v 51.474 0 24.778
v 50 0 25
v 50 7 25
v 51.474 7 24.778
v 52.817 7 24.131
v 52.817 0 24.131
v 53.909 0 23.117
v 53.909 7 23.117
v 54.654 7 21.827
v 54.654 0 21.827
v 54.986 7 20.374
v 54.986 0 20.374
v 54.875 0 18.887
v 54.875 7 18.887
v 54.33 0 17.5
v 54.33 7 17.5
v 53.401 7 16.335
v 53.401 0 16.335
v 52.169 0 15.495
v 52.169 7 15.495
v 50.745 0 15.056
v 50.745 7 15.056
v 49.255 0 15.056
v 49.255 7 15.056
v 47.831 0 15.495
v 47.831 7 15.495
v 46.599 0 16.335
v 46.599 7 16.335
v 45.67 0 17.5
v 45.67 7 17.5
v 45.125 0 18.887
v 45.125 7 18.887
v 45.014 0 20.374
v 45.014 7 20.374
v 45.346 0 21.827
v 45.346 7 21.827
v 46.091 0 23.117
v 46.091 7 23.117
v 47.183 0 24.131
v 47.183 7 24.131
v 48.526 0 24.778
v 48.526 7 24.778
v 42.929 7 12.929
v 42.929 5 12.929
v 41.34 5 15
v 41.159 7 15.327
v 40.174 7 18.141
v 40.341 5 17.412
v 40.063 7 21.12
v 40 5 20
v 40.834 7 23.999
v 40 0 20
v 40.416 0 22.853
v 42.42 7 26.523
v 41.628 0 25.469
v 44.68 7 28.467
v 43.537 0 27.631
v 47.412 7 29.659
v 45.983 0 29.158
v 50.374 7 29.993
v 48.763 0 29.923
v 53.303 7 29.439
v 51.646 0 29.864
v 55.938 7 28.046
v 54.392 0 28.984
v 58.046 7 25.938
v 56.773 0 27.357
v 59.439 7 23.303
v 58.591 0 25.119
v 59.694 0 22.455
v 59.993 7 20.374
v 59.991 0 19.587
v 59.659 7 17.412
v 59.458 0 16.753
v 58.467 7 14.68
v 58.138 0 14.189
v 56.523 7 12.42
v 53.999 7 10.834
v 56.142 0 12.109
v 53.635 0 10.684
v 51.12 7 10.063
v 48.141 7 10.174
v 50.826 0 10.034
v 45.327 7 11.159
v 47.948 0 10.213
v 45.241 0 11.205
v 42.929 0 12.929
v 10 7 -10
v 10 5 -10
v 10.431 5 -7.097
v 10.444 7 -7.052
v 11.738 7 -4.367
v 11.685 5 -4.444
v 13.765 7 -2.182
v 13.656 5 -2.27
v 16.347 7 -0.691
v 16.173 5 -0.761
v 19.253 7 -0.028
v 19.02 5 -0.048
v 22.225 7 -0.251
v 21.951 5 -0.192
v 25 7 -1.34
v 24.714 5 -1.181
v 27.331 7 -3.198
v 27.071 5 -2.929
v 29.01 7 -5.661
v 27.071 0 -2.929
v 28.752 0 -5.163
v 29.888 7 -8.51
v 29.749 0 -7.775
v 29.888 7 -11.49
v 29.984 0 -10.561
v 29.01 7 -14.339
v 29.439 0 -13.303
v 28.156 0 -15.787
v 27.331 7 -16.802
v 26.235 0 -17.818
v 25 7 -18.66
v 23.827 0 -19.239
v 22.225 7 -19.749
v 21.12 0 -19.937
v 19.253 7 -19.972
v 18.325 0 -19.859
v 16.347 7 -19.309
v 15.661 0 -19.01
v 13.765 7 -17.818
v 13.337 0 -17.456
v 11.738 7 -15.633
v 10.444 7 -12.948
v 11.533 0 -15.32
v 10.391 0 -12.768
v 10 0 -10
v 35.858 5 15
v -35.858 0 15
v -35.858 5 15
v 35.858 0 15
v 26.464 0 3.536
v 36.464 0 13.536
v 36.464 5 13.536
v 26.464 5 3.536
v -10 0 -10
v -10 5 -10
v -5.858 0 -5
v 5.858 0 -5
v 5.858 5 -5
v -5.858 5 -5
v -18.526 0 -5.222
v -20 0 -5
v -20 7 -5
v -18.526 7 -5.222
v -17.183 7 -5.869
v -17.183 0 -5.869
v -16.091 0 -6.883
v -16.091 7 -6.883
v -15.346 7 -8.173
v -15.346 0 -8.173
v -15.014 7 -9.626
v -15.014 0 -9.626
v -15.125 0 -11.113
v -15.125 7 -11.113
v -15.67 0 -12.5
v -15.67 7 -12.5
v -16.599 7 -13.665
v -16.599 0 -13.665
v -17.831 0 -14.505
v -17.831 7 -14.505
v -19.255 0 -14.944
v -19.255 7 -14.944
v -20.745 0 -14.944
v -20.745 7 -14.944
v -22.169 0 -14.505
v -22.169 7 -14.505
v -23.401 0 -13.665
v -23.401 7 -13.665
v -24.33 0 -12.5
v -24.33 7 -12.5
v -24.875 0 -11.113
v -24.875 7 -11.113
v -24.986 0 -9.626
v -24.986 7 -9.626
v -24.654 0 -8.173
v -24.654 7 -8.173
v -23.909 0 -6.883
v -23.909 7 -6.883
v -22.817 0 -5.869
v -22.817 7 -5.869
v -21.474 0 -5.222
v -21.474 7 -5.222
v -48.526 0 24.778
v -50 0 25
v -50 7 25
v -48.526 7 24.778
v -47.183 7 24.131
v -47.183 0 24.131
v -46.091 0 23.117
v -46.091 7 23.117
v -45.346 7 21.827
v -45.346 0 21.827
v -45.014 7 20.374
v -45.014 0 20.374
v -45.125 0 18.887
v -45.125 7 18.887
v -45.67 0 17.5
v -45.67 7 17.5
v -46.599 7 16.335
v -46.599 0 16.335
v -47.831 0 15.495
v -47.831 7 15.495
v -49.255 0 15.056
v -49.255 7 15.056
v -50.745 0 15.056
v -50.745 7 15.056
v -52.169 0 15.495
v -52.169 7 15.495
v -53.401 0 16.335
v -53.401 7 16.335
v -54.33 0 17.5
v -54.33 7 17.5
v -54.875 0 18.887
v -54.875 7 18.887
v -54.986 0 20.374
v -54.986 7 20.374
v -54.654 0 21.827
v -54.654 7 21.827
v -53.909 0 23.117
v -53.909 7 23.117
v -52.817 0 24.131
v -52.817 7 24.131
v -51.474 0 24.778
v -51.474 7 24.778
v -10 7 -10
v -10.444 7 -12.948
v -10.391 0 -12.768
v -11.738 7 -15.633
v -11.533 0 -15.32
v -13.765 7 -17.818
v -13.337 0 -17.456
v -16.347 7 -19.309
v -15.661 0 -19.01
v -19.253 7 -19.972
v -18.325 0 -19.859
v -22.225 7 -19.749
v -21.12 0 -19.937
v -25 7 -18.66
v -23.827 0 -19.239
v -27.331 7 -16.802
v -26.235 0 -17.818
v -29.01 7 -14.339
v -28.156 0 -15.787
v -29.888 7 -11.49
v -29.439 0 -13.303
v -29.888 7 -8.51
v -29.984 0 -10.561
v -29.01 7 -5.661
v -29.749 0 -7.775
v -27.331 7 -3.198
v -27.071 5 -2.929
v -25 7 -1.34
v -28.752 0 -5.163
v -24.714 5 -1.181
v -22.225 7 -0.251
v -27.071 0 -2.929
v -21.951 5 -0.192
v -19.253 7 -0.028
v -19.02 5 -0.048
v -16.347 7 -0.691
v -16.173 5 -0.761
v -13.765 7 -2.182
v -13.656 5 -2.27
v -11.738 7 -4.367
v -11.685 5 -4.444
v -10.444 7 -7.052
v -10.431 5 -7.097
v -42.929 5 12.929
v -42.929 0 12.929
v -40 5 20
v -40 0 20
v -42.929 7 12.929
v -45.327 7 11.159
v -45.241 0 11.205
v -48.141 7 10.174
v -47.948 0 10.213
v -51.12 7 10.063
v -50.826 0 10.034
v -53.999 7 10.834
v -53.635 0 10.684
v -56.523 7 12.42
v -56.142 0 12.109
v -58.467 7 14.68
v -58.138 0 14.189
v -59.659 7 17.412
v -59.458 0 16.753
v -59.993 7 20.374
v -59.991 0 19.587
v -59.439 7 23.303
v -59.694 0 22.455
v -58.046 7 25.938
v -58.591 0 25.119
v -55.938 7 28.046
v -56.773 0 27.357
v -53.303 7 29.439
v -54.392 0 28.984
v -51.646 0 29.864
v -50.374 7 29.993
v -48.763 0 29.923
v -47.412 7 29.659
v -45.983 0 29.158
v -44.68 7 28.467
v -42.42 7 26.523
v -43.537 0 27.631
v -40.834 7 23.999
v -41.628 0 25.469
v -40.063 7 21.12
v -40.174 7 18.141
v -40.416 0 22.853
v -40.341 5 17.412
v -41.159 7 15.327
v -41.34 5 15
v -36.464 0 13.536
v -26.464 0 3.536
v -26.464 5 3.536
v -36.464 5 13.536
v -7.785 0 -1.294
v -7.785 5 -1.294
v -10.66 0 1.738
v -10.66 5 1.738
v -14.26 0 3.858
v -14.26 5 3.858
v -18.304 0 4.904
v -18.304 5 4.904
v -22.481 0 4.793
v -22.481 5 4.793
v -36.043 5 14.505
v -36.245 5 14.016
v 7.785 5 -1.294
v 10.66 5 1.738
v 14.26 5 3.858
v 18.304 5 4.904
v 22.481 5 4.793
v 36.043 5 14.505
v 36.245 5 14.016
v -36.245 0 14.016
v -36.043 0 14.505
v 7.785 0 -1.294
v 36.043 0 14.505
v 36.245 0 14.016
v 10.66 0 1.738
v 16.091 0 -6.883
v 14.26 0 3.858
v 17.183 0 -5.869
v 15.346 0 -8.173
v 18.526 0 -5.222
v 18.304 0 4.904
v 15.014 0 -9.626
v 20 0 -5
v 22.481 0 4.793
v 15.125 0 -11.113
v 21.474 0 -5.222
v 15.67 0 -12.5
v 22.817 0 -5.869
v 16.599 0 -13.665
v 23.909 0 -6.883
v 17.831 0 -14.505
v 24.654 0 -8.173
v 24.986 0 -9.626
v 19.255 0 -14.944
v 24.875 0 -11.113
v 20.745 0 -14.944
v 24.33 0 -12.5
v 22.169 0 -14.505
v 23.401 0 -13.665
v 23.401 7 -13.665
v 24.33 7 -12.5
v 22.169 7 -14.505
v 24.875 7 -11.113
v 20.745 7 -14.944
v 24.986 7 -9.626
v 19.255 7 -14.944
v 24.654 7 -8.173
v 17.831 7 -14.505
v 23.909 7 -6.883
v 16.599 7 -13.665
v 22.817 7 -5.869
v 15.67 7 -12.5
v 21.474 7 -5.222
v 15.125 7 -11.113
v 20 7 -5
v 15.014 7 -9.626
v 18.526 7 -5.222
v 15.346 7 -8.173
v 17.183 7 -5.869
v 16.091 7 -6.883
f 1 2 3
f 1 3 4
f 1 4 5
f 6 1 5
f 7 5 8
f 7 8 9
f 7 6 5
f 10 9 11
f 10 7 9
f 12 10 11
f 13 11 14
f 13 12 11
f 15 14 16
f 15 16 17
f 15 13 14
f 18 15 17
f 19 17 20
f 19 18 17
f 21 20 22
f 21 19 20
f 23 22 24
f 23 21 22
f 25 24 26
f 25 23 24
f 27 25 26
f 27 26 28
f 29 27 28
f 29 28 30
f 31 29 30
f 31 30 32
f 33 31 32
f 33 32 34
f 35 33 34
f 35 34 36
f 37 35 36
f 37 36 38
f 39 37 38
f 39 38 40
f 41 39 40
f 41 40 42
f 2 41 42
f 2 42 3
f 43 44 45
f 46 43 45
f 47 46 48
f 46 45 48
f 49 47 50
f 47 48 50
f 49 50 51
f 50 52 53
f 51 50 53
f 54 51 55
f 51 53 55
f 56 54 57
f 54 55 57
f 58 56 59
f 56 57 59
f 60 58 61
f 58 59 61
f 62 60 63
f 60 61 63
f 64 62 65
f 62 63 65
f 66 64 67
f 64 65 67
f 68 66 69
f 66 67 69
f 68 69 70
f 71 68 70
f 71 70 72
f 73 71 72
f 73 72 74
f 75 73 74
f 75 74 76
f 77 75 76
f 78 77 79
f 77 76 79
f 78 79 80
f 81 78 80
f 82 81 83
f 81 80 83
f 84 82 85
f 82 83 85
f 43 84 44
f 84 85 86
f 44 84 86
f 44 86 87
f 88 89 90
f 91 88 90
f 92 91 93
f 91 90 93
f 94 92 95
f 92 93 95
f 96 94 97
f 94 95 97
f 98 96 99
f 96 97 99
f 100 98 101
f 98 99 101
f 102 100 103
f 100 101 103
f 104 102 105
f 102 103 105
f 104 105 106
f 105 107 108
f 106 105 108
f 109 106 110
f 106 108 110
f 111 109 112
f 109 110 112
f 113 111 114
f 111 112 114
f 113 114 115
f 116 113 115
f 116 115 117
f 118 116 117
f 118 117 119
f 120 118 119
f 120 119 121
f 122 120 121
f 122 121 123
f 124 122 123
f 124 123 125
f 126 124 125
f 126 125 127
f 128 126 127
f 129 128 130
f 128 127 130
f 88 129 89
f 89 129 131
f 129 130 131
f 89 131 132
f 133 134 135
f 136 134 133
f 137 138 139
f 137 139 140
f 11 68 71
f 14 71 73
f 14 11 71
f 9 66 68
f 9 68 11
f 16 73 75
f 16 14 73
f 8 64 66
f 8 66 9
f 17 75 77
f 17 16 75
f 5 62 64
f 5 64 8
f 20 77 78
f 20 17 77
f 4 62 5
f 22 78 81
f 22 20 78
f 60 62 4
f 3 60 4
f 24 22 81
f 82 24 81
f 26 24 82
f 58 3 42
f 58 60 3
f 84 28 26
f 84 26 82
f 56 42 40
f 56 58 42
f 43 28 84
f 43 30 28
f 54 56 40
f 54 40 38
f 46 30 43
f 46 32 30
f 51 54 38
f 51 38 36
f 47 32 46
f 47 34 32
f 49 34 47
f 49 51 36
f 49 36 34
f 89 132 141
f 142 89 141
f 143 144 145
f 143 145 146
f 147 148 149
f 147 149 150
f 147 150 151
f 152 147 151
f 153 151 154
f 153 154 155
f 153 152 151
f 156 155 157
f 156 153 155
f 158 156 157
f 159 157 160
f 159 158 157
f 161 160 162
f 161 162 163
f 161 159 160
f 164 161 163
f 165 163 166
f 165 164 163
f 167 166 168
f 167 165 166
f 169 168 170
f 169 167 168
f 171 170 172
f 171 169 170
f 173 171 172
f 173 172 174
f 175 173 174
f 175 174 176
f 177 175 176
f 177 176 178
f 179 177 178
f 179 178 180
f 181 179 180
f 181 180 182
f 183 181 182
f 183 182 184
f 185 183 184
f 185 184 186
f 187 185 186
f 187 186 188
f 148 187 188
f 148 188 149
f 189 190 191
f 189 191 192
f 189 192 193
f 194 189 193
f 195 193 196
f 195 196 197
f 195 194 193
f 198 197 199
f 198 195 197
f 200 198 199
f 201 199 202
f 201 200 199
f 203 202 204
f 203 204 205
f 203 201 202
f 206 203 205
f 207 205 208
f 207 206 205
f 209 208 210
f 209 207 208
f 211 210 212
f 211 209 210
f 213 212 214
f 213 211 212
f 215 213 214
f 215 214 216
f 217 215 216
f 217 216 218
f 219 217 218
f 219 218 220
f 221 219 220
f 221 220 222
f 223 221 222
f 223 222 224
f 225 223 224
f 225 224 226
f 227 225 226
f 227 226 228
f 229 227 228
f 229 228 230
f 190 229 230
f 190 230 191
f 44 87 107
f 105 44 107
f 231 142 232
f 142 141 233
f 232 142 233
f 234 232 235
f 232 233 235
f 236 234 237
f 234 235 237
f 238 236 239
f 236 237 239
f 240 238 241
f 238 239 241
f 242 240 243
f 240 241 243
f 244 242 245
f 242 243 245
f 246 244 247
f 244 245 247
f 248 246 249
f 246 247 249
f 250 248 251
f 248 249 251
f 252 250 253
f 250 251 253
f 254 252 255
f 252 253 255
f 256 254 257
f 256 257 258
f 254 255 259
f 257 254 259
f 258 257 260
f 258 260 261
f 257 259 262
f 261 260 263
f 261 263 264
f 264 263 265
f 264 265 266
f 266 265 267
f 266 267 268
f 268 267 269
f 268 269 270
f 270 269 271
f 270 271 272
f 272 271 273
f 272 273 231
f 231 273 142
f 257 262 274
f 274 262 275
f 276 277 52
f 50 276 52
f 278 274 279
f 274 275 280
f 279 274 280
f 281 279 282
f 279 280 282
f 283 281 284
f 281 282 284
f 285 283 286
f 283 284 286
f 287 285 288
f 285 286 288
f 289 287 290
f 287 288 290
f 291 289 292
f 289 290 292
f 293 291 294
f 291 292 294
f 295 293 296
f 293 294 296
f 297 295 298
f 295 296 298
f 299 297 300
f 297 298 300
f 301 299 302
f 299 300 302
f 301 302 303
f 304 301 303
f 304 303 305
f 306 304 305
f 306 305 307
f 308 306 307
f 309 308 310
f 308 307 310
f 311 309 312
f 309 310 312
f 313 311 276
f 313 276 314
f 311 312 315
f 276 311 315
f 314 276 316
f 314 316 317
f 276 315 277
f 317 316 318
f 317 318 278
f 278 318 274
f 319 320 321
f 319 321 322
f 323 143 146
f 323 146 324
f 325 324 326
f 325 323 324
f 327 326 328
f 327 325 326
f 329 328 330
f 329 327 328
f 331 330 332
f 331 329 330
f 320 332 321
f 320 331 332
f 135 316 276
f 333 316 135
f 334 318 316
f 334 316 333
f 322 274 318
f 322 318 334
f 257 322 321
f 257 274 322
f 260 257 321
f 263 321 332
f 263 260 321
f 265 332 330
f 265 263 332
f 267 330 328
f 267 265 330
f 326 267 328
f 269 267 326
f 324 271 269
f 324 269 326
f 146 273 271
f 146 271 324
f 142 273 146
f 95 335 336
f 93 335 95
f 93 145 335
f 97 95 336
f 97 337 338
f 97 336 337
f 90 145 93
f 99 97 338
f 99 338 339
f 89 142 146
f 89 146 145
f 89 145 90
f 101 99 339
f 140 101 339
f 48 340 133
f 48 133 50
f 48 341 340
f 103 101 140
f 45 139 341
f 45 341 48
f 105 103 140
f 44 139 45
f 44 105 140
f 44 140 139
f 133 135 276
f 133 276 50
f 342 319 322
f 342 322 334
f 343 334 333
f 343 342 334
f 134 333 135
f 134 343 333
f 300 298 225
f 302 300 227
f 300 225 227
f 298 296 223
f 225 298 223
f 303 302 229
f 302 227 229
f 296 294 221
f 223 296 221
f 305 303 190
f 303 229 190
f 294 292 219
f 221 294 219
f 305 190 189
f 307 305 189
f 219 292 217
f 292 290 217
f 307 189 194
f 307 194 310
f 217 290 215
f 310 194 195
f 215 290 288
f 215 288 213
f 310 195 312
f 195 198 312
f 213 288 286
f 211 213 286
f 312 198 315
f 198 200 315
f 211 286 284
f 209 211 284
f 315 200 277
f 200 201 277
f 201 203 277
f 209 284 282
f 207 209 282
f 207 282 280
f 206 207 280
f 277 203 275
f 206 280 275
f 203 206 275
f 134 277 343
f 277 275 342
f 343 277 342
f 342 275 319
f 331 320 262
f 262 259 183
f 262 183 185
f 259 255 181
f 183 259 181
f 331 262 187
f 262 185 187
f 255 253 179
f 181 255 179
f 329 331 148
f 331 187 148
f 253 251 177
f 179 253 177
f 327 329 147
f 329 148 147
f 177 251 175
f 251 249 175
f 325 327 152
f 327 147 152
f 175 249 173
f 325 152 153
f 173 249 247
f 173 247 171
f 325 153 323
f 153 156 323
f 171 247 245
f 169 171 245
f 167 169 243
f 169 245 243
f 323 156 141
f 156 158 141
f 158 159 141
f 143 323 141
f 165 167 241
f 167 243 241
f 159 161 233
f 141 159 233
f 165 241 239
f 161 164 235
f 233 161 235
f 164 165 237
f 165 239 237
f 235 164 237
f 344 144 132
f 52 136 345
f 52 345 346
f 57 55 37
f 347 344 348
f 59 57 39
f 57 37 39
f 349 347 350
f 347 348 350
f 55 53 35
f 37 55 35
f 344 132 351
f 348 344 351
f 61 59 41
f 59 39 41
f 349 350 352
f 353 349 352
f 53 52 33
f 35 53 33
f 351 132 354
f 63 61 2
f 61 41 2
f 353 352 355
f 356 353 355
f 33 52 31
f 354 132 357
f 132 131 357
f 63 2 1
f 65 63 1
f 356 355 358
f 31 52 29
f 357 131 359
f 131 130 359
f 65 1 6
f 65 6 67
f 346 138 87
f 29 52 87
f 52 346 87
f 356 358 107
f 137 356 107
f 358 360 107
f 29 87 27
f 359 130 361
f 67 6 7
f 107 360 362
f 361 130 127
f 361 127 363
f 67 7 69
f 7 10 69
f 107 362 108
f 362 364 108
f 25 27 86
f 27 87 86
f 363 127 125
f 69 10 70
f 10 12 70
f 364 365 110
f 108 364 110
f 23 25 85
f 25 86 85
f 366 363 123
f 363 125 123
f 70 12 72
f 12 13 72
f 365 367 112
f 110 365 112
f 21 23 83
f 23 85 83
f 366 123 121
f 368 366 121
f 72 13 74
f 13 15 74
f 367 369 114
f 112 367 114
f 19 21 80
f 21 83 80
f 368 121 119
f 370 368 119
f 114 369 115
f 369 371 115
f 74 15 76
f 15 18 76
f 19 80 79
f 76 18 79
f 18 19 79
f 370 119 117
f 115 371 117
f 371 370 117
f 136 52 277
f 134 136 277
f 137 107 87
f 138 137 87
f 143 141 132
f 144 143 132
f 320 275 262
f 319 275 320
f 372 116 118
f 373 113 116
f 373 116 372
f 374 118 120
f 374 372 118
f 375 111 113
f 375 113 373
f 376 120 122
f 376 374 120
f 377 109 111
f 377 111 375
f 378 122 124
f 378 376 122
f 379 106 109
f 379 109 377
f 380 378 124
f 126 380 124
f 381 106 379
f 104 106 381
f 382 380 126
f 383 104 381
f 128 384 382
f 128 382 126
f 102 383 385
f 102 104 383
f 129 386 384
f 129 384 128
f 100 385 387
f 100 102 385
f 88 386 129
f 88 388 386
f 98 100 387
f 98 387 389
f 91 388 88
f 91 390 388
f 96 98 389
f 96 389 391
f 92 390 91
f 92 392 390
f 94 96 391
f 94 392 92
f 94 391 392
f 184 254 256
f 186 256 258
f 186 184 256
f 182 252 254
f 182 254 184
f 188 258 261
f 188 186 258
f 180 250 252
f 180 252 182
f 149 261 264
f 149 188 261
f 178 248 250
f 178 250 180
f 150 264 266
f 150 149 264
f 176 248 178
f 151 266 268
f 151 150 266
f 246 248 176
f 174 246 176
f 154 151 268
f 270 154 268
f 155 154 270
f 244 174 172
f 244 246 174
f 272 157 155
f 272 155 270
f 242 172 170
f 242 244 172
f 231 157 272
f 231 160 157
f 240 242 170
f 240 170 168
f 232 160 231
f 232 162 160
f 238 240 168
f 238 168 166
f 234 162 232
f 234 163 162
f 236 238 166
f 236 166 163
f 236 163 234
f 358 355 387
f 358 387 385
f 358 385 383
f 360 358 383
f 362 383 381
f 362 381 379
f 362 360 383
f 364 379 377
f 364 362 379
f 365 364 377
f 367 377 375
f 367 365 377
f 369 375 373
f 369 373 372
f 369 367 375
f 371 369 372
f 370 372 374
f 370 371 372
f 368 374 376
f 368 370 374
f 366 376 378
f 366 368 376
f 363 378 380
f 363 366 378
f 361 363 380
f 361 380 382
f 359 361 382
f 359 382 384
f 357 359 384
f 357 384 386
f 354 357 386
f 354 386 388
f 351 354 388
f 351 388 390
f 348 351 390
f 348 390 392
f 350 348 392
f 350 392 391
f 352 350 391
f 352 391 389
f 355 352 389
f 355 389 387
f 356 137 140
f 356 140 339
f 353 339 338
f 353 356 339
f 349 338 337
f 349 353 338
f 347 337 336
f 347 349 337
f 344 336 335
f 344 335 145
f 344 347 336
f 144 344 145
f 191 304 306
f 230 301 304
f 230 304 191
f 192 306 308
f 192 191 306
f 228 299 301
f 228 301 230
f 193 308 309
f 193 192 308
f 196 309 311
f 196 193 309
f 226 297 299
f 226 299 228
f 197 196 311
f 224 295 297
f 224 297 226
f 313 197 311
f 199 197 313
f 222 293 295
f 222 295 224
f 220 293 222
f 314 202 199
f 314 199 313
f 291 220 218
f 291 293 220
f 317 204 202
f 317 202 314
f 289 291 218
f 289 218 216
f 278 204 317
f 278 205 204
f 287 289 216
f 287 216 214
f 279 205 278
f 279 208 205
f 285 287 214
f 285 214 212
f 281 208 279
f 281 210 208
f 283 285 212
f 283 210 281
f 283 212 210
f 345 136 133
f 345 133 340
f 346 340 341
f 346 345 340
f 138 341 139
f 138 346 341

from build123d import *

# Parameters (mm, degrees)
SKETCH1_R               = 5
BOSS_EXTRUDE1_DEPTH     = 5
SKETCH1_3_R             = 10
SKETCH1_3_R_2           = 5
BOSS_EXTRUDE2_DEPTH     = 7
CUT_EXTRUDE1_DEPTH      = 68.268120235
CUT_EXTRUDE1_DEPTH_BACK = 68.268120235


with BuildPart() as part:
    # Sketch1 → Boss-Extrude1 (new body)
    with BuildSketch(Plane(origin=(0, 0, 0), x_dir=(1, 0, 0), z_dir=(0, 1, 0))):
        with BuildLine():
            ThreePointArc((-10, 10), (-23.826834324, 19.238795325), (-27.071067812, 2.928932188))
            Line((-27.071067812, 2.928932188), (-42.928932188, -12.928932188))
            ThreePointArc((-42.928932188, -12.928932188), (-59.238795325, -23.826834324), (-40, -20))
            Line((-40, -20), (40, -20))
            ThreePointArc((40, -20), (59.238795325, -23.826834324), (42.928932188, -12.928932188))
            Line((42.928932188, -12.928932188), (27.071067812, 2.928932188))
            ThreePointArc((27.071067812, 2.928932188), (23.826834324, 19.238795325), (10, 10))
            Line((10, 10), (-10, 10))
        make_face()
        with Locations((-20, 10)):
            Circle(SKETCH1_R, mode=Mode.SUBTRACT)
        with Locations((20, 10)):
            Circle(SKETCH1_R, mode=Mode.SUBTRACT)
        with Locations((50, -20)):
            Circle(SKETCH1_R, mode=Mode.SUBTRACT)
        with Locations((-50, -20)):
            Circle(SKETCH1_R, mode=Mode.SUBTRACT)
    extrude(amount=BOSS_EXTRUDE1_DEPTH)

    # Sketch1<3> → Boss-Extrude2 (add)
    # profile 1 of 4: a face of its own
    with BuildSketch(Plane(origin=(0, 0, 0), x_dir=(1, 0, 0), z_dir=(0, 1, 0))):
        with Locations((-50, -20)):
            Circle(SKETCH1_3_R)
        with Locations((-50, -20)):
            Circle(SKETCH1_3_R_2, mode=Mode.SUBTRACT)
    # profile 2 of 4: a face of its own
    with BuildSketch(Plane(origin=(0, 0, 0), x_dir=(1, 0, 0), z_dir=(0, 1, 0))):
        with Locations((-20, 10)):
            Circle(SKETCH1_3_R)
        with Locations((-20, 10)):
            Circle(SKETCH1_3_R_2, mode=Mode.SUBTRACT)
    # profile 3 of 4: a face of its own
    with BuildSketch(Plane(origin=(0, 0, 0), x_dir=(1, 0, 0), z_dir=(0, 1, 0))):
        with Locations((20, 10)):
            Circle(SKETCH1_3_R)
        with Locations((20, 10)):
            Circle(SKETCH1_3_R_2, mode=Mode.SUBTRACT)
    # profile 4 of 4: a face of its own
    with BuildSketch(Plane(origin=(0, 0, 0), x_dir=(1, 0, 0), z_dir=(0, 1, 0))):
        with Locations((50, -20)):
            Circle(SKETCH1_3_R)
        with Locations((50, -20)):
            Circle(SKETCH1_3_R_2, mode=Mode.SUBTRACT)
    extrude(amount=BOSS_EXTRUDE2_DEPTH)

    # Sketch3 → Cut-Extrude1 (cut, two sides: drawn at the far end of the back side and taken through both)
    with BuildSketch(Plane(origin=(0, 5, 0), x_dir=(1, 0, 0), z_dir=(0, 1, 0)).offset(-CUT_EXTRUDE1_DEPTH_BACK)):
        with BuildLine():
            Line((-35.857864376, -15), (35.857864376, -15))
            ThreePointArc((35.857864376, -15), (36.141807012, -14.259748515), (36.464466094, -13.535533906))
            Line((36.464466094, -13.535533906), (26.464466094, -3.535533906))
            ThreePointArc((26.464466094, -3.535533906), (14.259748515, -3.858192988), (5.857864376, 5))
            Line((5.857864376, 5), (-5.857864376, 5))
            ThreePointArc((-5.857864376, 5), (-14.259748515, -3.858192988), (-26.464466094, -3.535533906))
            Line((-26.464466094, -3.535533906), (-36.464466094, -13.535533906))
            ThreePointArc((-36.464466094, -13.535533906), (-36.141807012, -14.259748515), (-35.857864376, -15))
        make_face()
    extrude(amount=CUT_EXTRUDE1_DEPTH + CUT_EXTRUDE1_DEPTH_BACK, mode=Mode.SUBTRACT)


solid = part.part
